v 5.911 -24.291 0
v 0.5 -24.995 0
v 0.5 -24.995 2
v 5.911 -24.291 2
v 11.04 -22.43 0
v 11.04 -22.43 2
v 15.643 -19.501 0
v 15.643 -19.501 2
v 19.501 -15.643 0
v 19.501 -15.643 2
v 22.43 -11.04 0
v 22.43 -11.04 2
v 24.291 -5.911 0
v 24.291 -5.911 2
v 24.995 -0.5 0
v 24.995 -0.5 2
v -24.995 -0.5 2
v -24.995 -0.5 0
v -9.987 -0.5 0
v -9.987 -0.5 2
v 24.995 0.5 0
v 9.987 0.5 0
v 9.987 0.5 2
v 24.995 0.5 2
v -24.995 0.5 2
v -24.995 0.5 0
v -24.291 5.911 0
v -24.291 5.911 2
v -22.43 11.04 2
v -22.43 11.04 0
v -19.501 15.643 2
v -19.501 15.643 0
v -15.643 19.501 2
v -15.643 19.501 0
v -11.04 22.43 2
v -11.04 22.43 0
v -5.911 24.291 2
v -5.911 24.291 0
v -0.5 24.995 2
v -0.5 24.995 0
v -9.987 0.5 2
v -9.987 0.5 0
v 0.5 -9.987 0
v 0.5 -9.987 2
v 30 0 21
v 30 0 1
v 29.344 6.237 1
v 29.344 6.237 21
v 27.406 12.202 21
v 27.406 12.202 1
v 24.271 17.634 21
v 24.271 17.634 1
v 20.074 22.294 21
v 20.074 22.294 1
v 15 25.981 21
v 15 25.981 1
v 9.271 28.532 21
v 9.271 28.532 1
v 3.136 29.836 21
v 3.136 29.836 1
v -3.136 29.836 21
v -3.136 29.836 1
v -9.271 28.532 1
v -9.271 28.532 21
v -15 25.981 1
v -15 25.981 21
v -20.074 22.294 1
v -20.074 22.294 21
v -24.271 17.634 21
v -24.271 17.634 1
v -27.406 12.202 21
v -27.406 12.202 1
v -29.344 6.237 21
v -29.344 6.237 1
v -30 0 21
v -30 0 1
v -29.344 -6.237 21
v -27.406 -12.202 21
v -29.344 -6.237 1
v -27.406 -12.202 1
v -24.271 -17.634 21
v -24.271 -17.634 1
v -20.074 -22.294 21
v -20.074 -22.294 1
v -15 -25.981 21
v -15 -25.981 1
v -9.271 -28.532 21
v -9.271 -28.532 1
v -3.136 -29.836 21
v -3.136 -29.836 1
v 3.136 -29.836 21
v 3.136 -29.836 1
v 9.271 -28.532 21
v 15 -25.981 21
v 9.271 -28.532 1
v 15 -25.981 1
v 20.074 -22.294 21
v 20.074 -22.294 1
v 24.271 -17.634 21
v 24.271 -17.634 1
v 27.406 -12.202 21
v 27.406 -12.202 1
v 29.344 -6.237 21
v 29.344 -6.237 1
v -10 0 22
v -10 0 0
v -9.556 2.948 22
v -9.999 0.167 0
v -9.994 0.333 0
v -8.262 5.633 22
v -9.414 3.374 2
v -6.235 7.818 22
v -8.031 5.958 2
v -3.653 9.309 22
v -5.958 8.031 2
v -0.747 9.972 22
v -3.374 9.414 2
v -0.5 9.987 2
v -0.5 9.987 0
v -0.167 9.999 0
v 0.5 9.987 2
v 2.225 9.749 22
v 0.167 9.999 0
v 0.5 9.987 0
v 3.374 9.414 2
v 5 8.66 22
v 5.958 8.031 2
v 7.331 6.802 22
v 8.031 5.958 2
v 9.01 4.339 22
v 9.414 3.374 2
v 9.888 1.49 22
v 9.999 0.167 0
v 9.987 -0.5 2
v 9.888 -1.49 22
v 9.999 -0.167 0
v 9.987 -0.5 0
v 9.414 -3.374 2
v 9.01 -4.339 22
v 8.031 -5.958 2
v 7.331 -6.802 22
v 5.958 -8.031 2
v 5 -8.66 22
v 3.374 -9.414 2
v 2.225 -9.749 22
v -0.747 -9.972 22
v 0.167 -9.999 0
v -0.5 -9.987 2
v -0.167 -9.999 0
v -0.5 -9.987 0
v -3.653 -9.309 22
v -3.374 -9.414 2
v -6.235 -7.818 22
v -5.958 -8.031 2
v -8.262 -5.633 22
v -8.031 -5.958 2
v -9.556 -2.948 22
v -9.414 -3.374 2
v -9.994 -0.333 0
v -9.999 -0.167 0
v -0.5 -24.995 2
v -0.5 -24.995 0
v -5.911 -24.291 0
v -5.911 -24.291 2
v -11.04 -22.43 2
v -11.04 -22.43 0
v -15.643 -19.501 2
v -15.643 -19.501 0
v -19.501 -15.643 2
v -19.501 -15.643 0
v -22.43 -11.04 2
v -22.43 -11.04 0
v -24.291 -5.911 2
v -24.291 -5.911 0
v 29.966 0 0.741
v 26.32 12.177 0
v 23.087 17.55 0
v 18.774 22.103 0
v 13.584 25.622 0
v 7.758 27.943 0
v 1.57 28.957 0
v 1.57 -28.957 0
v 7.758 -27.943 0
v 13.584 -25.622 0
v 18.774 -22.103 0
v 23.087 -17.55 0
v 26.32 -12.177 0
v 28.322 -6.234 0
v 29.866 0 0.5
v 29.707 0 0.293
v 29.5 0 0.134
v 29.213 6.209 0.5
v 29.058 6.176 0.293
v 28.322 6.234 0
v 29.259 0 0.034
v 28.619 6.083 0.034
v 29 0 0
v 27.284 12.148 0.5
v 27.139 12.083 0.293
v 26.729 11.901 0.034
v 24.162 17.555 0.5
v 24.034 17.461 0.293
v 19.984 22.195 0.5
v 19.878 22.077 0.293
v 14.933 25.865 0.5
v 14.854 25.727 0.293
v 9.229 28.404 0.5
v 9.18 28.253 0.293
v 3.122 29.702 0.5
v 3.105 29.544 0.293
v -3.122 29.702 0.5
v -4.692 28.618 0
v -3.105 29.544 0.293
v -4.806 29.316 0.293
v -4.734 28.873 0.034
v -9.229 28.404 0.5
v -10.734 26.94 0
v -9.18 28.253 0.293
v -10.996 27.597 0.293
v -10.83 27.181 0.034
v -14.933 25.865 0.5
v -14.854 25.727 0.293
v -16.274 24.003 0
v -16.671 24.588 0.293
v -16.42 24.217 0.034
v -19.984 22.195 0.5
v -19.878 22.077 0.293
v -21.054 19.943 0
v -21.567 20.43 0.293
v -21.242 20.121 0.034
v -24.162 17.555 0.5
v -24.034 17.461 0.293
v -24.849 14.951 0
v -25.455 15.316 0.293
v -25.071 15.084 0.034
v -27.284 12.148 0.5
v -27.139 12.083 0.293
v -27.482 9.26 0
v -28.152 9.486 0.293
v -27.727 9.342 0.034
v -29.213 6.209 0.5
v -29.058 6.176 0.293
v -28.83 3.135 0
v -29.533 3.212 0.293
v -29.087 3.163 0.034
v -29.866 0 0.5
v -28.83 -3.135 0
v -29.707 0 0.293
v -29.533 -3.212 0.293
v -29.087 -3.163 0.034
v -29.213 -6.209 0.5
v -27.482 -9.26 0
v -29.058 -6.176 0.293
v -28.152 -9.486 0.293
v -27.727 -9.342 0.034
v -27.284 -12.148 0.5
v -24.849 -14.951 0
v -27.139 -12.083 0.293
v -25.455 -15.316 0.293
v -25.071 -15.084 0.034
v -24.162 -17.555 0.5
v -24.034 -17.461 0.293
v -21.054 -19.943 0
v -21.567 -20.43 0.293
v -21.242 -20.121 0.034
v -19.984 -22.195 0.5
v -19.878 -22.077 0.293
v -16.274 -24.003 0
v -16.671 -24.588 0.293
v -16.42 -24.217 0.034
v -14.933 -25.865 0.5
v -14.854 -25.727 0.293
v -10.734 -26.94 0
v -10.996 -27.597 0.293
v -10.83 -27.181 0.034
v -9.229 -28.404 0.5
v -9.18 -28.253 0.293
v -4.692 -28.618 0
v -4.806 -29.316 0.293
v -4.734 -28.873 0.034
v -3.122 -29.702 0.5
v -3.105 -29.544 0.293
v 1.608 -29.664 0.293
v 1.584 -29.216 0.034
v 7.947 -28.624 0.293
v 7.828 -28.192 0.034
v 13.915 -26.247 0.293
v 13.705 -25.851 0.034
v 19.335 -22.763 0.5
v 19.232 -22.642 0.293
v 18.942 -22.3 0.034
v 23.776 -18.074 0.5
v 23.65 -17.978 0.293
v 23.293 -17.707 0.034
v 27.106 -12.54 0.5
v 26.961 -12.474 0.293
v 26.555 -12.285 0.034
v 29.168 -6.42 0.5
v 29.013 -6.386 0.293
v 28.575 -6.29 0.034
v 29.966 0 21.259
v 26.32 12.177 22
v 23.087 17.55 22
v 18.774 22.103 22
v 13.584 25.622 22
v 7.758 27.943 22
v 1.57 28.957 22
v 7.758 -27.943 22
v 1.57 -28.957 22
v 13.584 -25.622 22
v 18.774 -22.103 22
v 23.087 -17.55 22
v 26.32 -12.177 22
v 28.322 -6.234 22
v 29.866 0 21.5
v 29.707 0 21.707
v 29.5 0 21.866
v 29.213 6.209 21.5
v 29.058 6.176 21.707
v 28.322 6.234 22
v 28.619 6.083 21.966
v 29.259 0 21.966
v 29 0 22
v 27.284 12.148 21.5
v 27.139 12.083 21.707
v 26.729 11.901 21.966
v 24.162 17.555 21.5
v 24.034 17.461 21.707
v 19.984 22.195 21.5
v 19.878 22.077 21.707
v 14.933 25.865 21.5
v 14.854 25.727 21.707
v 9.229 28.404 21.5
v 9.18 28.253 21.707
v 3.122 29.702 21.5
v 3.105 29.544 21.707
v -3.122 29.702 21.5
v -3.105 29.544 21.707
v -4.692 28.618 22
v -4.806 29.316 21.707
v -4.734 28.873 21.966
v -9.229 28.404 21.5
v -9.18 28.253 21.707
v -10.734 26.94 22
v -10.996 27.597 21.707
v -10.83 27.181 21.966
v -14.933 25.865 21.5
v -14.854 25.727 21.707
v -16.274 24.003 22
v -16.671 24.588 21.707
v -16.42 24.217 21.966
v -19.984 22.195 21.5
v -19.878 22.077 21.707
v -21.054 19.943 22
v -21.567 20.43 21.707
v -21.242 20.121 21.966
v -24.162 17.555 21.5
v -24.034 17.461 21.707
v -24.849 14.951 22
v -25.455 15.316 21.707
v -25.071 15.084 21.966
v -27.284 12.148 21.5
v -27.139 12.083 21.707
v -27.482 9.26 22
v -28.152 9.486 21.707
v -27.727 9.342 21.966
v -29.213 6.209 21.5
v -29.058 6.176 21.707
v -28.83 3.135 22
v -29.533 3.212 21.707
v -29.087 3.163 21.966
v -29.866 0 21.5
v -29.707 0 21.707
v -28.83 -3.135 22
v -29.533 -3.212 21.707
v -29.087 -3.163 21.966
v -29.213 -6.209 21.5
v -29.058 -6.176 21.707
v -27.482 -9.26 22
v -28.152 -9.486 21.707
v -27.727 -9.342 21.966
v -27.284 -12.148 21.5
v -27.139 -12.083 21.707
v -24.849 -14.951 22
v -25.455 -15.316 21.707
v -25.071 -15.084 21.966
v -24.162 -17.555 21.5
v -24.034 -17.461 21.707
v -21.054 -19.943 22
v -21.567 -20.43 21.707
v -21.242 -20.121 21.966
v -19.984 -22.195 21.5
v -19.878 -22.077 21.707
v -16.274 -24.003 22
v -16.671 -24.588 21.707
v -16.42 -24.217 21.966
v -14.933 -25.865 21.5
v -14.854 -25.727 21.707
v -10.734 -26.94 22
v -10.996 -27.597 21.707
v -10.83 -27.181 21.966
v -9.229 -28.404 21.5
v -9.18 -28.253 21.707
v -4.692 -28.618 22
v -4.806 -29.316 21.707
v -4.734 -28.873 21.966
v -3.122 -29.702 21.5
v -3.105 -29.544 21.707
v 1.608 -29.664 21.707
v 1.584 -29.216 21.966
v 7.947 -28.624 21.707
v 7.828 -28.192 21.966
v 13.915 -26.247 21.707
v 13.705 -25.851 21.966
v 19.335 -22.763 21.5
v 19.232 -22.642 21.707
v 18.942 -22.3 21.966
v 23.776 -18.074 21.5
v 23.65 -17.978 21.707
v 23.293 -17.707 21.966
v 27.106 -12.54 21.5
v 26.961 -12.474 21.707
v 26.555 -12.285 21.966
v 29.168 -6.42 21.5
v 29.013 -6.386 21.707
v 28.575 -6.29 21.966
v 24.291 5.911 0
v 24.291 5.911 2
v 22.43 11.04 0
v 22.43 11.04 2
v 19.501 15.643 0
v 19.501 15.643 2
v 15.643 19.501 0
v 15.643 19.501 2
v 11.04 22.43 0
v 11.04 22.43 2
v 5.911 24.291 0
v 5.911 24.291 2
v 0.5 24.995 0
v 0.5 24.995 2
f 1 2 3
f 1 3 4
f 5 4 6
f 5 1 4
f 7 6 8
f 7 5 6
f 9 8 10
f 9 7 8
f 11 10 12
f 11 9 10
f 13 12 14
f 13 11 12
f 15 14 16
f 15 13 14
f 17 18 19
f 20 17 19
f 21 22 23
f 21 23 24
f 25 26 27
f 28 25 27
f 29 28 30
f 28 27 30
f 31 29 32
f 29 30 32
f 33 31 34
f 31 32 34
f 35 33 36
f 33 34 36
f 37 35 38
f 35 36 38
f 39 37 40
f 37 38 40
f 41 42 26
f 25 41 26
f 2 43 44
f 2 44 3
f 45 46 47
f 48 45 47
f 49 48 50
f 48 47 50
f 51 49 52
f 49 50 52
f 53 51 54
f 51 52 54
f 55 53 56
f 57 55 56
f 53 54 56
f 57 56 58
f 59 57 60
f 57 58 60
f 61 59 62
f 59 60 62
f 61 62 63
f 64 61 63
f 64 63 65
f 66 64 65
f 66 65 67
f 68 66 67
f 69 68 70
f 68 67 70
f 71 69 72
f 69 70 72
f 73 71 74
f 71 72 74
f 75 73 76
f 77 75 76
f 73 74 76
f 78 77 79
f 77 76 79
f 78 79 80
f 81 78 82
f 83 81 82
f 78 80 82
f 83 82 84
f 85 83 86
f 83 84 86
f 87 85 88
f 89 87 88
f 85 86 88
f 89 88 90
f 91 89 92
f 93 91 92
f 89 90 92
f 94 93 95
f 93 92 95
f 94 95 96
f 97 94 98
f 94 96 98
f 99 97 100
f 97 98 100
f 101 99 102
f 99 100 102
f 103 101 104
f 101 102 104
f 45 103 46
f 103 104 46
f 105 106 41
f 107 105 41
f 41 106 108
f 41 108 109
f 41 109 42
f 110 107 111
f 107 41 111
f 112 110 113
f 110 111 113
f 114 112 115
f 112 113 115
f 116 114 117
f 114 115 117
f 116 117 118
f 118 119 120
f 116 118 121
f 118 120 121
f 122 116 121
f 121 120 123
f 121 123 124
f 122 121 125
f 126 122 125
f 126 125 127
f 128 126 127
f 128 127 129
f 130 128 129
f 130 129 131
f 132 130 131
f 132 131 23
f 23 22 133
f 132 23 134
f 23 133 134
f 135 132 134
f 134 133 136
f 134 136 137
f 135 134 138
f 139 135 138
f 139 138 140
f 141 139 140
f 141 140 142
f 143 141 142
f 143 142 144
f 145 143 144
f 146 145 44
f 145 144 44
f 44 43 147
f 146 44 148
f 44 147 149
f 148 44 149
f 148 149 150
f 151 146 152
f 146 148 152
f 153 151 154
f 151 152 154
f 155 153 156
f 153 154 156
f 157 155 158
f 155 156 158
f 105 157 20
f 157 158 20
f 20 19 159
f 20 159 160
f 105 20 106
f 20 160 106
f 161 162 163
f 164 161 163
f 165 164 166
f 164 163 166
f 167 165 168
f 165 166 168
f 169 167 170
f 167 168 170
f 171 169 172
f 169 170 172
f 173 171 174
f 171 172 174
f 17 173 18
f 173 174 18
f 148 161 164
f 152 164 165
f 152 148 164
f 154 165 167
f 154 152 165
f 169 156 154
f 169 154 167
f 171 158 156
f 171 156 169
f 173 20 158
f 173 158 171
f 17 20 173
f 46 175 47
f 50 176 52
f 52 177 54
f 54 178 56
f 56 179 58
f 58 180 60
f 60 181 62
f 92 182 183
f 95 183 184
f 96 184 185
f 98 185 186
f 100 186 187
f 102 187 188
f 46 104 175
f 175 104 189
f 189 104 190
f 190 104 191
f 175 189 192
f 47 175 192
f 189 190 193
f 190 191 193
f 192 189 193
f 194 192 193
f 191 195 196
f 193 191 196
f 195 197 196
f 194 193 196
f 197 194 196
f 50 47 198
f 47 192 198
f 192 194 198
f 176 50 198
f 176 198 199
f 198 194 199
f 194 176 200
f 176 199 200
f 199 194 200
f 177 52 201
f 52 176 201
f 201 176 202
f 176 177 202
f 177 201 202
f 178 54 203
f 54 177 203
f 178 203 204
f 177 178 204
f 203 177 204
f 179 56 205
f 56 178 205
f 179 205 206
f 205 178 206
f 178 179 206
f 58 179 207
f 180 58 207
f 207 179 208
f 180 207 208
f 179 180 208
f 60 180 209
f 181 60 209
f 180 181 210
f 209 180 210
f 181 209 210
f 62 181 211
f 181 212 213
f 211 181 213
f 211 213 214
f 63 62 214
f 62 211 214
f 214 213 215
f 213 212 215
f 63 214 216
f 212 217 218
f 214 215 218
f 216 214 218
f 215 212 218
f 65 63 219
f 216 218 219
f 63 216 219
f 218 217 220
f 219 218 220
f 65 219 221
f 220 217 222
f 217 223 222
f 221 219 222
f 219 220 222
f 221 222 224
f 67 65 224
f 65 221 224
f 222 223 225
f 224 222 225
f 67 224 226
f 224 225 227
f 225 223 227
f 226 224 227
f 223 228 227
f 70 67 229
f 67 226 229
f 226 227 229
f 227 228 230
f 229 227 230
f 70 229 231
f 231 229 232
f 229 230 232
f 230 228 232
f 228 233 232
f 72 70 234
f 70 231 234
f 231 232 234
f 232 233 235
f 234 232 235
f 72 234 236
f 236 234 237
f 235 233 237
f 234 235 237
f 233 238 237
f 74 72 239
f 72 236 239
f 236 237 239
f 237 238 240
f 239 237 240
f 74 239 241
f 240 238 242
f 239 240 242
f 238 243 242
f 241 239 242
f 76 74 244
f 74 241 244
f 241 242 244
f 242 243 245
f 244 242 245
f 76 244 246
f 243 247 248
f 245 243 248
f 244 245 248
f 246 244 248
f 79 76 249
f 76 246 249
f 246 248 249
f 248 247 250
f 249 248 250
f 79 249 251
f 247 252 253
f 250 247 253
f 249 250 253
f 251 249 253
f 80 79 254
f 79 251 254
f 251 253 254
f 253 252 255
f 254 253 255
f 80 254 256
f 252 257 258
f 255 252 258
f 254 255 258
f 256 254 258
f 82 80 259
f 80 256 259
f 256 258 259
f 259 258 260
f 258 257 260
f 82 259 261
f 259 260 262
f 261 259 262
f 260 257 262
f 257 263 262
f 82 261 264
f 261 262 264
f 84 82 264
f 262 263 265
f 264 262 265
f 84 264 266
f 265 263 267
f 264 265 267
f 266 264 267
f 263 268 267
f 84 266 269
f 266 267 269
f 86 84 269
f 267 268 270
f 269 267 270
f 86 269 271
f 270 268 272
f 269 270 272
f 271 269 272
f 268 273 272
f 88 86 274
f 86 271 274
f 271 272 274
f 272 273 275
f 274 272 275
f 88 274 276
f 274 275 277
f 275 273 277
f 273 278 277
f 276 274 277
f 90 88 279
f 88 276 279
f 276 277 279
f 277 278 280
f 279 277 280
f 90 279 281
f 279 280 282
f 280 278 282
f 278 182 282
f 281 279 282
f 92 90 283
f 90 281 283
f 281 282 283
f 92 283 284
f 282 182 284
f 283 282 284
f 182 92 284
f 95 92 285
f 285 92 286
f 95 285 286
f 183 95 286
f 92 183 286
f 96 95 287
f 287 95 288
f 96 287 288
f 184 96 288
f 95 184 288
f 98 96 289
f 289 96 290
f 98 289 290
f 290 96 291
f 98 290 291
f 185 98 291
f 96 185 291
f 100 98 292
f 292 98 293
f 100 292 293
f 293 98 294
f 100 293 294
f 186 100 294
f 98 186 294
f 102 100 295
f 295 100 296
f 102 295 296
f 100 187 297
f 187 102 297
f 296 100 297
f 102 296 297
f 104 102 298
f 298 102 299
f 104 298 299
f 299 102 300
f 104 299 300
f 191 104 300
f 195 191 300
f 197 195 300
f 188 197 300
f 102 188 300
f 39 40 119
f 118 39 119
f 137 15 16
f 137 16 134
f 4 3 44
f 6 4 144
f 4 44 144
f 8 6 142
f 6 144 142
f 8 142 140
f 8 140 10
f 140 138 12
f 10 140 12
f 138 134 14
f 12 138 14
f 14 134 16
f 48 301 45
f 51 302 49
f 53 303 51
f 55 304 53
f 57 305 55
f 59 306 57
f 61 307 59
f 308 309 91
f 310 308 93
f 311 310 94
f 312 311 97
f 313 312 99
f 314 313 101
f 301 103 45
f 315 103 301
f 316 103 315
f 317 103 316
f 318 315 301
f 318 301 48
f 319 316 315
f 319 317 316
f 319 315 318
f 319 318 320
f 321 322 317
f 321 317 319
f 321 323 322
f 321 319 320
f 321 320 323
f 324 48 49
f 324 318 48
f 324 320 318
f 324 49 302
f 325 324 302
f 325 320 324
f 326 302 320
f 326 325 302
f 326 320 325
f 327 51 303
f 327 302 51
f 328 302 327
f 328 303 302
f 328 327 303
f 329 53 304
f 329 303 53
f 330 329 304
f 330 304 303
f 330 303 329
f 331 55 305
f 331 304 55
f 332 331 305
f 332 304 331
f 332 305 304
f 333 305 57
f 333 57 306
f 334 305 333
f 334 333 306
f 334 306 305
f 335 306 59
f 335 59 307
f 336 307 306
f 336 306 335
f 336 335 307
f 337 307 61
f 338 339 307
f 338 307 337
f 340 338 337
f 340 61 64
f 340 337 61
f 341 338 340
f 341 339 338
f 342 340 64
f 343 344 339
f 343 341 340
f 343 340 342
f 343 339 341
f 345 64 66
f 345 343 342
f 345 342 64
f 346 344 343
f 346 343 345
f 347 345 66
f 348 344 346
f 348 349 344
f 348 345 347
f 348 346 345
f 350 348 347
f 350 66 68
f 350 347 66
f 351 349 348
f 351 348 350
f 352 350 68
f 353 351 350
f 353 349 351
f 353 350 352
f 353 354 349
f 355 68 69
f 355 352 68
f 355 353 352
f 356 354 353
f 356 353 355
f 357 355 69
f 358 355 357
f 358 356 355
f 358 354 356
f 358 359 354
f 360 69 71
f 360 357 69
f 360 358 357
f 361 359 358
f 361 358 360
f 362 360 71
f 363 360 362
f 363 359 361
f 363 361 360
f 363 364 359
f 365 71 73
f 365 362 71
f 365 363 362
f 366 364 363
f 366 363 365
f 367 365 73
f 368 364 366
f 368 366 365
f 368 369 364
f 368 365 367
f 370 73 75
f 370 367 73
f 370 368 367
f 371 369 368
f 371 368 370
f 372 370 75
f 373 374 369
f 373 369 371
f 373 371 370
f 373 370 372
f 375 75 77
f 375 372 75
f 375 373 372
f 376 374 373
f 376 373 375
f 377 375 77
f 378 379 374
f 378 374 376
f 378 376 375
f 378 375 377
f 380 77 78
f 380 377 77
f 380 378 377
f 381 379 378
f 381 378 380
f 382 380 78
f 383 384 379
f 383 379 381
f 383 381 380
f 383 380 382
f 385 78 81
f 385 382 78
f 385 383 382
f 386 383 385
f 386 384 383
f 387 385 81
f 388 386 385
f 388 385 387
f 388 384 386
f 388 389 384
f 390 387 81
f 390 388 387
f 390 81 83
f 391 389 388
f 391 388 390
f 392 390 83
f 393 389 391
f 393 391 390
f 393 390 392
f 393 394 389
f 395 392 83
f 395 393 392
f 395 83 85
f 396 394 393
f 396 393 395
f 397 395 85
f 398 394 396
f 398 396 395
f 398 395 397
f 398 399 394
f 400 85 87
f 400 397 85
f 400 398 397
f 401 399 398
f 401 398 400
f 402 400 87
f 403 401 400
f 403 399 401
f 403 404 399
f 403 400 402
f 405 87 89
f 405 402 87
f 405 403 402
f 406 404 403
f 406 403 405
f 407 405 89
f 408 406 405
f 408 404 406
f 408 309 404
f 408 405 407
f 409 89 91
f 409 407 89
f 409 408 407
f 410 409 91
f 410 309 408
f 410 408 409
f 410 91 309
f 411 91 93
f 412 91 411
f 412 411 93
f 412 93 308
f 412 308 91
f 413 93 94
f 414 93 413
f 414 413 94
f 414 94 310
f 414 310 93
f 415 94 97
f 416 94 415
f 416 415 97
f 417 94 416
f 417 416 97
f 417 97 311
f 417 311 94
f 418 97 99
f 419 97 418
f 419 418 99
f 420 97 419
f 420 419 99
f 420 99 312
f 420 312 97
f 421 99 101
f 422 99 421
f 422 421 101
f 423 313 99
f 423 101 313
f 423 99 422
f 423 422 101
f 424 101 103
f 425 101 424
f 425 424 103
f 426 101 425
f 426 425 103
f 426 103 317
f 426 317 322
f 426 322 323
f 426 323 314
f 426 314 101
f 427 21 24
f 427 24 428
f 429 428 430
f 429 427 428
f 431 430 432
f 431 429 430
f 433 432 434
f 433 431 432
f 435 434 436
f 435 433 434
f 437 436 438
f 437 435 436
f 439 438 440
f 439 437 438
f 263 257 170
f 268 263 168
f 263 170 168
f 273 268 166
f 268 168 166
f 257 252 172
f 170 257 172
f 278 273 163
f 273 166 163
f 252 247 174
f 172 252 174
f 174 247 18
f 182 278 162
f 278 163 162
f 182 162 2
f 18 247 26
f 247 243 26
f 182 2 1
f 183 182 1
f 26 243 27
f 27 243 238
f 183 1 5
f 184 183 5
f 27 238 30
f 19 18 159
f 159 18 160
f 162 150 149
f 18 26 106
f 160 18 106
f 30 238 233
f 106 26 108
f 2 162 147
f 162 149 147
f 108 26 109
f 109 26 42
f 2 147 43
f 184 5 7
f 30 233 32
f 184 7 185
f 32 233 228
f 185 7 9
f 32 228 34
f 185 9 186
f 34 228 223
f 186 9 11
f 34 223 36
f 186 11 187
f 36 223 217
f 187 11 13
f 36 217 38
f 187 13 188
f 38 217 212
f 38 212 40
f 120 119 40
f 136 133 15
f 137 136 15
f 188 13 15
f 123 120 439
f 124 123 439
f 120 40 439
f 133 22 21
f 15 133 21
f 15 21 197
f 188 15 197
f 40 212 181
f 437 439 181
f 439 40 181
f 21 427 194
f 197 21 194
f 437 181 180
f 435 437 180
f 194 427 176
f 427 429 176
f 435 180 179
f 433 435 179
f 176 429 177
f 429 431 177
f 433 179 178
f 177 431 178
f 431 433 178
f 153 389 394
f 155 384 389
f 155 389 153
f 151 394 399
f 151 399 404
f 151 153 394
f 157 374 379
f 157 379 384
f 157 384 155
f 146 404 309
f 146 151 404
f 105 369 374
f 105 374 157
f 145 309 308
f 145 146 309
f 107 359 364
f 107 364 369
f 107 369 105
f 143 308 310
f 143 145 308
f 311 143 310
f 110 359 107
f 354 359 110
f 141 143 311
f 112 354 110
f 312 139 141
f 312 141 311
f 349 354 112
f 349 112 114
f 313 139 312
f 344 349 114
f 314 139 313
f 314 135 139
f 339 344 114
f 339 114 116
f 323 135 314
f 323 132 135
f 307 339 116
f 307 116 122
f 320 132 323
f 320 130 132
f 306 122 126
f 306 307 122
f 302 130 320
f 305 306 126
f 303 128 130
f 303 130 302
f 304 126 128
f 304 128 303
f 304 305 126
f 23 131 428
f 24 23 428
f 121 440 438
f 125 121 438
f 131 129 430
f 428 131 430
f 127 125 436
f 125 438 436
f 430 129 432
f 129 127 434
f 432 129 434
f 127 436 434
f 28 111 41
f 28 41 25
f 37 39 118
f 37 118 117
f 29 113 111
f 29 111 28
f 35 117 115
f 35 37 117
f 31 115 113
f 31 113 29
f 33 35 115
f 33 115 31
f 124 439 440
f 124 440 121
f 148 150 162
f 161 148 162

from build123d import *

# Parameters (mm, degrees)
SKETCH1_R           = 30
BOSS_EXTRUDE1_DEPTH = 22
SKETCH2_R           = 10
CUT_EXTRUDE1_DEPTH  = 66
FILLET1_R           = 1
CUT_EXTRUDE2_DEPTH  = 2


with BuildPart() as part:
    # Sketch1 → Boss-Extrude1 (new body)
    with BuildSketch(Plane.XY):
        Circle(SKETCH1_R)
    extrude(amount=BOSS_EXTRUDE1_DEPTH)

    # Sketch2 → Cut-Extrude1 (cut)
    with BuildSketch(Plane(origin=(0, 0, 0), x_dir=(-1, 0, 0), z_dir=(0, 0, -1))):
        Circle(SKETCH2_R)
    extrude(amount=-CUT_EXTRUDE1_DEPTH, mode=Mode.SUBTRACT)

    # Fillet1
    fillet1_edges = [part.edges().sort_by_distance(p)[0] for p in [
        (-30, 0, 0),
        (-30, 0, 22),
    ]]
    fillet(fillet1_edges, radius=FILLET1_R)

    # Sketch3 → Cut-Extrude2 (cut)
    with BuildSketch(Plane(origin=(0, 0, 0), x_dir=(-1, 0, 0), z_dir=(0, 0, -1))):
        with BuildLine():
            Line((-0.5, 24.9949995), (-0.5, 3.464101615))
            ThreePointArc((-0.5, 3.464101615), (-2.474873734, 2.474873734), (-3.464101615, 0.5))
            Line((-3.464101615, 0.5), (-24.9949995, 0.5))
            ThreePointArc((-24.9949995, 0.5), (-17.67766953, 17.67766953), (-0.5, 24.9949995))
        make_face()
        with BuildLine():
            Line((0.5, 24.9949995), (0.5, 3.464101615))
            ThreePointArc((0.5, 3.464101615), (2.474873734, 2.474873734), (3.464101615, 0.5))
            Line((3.464101615, 0.5), (24.9949995, 0.5))
            ThreePointArc((24.9949995, 0.5), (17.67766953, 17.67766953), (0.5, 24.9949995))
        make_face()
        with BuildLine():
            Line((-24.9949995, -0.5), (-3.464101615, -0.5))
            ThreePointArc((-3.464101615, -0.5), (-2.474873734, -2.474873734), (-0.5, -3.464101615))
            Line((-0.5, -3.464101615), (-0.5, -24.9949995))
            ThreePointArc((-0.5, -24.9949995), (-17.67766953, -17.67766953), (-24.9949995, -0.5))
        make_face()
        with BuildLine():
            Line((0.5, -3.464101615), (0.5, -24.9949995))
            ThreePointArc((0.5, -24.9949995), (17.67766953, -17.67766953), (24.9949995, -0.5))
            Line((24.9949995, -0.5), (3.464101615, -0.5))
            ThreePointArc((3.464101615, -0.5), (2.474873734, -2.474873734), (0.5, -3.464101615))
        make_face()
    extrude(amount=-CUT_EXTRUDE2_DEPTH, mode=Mode.SUBTRACT)


solid = part.part
